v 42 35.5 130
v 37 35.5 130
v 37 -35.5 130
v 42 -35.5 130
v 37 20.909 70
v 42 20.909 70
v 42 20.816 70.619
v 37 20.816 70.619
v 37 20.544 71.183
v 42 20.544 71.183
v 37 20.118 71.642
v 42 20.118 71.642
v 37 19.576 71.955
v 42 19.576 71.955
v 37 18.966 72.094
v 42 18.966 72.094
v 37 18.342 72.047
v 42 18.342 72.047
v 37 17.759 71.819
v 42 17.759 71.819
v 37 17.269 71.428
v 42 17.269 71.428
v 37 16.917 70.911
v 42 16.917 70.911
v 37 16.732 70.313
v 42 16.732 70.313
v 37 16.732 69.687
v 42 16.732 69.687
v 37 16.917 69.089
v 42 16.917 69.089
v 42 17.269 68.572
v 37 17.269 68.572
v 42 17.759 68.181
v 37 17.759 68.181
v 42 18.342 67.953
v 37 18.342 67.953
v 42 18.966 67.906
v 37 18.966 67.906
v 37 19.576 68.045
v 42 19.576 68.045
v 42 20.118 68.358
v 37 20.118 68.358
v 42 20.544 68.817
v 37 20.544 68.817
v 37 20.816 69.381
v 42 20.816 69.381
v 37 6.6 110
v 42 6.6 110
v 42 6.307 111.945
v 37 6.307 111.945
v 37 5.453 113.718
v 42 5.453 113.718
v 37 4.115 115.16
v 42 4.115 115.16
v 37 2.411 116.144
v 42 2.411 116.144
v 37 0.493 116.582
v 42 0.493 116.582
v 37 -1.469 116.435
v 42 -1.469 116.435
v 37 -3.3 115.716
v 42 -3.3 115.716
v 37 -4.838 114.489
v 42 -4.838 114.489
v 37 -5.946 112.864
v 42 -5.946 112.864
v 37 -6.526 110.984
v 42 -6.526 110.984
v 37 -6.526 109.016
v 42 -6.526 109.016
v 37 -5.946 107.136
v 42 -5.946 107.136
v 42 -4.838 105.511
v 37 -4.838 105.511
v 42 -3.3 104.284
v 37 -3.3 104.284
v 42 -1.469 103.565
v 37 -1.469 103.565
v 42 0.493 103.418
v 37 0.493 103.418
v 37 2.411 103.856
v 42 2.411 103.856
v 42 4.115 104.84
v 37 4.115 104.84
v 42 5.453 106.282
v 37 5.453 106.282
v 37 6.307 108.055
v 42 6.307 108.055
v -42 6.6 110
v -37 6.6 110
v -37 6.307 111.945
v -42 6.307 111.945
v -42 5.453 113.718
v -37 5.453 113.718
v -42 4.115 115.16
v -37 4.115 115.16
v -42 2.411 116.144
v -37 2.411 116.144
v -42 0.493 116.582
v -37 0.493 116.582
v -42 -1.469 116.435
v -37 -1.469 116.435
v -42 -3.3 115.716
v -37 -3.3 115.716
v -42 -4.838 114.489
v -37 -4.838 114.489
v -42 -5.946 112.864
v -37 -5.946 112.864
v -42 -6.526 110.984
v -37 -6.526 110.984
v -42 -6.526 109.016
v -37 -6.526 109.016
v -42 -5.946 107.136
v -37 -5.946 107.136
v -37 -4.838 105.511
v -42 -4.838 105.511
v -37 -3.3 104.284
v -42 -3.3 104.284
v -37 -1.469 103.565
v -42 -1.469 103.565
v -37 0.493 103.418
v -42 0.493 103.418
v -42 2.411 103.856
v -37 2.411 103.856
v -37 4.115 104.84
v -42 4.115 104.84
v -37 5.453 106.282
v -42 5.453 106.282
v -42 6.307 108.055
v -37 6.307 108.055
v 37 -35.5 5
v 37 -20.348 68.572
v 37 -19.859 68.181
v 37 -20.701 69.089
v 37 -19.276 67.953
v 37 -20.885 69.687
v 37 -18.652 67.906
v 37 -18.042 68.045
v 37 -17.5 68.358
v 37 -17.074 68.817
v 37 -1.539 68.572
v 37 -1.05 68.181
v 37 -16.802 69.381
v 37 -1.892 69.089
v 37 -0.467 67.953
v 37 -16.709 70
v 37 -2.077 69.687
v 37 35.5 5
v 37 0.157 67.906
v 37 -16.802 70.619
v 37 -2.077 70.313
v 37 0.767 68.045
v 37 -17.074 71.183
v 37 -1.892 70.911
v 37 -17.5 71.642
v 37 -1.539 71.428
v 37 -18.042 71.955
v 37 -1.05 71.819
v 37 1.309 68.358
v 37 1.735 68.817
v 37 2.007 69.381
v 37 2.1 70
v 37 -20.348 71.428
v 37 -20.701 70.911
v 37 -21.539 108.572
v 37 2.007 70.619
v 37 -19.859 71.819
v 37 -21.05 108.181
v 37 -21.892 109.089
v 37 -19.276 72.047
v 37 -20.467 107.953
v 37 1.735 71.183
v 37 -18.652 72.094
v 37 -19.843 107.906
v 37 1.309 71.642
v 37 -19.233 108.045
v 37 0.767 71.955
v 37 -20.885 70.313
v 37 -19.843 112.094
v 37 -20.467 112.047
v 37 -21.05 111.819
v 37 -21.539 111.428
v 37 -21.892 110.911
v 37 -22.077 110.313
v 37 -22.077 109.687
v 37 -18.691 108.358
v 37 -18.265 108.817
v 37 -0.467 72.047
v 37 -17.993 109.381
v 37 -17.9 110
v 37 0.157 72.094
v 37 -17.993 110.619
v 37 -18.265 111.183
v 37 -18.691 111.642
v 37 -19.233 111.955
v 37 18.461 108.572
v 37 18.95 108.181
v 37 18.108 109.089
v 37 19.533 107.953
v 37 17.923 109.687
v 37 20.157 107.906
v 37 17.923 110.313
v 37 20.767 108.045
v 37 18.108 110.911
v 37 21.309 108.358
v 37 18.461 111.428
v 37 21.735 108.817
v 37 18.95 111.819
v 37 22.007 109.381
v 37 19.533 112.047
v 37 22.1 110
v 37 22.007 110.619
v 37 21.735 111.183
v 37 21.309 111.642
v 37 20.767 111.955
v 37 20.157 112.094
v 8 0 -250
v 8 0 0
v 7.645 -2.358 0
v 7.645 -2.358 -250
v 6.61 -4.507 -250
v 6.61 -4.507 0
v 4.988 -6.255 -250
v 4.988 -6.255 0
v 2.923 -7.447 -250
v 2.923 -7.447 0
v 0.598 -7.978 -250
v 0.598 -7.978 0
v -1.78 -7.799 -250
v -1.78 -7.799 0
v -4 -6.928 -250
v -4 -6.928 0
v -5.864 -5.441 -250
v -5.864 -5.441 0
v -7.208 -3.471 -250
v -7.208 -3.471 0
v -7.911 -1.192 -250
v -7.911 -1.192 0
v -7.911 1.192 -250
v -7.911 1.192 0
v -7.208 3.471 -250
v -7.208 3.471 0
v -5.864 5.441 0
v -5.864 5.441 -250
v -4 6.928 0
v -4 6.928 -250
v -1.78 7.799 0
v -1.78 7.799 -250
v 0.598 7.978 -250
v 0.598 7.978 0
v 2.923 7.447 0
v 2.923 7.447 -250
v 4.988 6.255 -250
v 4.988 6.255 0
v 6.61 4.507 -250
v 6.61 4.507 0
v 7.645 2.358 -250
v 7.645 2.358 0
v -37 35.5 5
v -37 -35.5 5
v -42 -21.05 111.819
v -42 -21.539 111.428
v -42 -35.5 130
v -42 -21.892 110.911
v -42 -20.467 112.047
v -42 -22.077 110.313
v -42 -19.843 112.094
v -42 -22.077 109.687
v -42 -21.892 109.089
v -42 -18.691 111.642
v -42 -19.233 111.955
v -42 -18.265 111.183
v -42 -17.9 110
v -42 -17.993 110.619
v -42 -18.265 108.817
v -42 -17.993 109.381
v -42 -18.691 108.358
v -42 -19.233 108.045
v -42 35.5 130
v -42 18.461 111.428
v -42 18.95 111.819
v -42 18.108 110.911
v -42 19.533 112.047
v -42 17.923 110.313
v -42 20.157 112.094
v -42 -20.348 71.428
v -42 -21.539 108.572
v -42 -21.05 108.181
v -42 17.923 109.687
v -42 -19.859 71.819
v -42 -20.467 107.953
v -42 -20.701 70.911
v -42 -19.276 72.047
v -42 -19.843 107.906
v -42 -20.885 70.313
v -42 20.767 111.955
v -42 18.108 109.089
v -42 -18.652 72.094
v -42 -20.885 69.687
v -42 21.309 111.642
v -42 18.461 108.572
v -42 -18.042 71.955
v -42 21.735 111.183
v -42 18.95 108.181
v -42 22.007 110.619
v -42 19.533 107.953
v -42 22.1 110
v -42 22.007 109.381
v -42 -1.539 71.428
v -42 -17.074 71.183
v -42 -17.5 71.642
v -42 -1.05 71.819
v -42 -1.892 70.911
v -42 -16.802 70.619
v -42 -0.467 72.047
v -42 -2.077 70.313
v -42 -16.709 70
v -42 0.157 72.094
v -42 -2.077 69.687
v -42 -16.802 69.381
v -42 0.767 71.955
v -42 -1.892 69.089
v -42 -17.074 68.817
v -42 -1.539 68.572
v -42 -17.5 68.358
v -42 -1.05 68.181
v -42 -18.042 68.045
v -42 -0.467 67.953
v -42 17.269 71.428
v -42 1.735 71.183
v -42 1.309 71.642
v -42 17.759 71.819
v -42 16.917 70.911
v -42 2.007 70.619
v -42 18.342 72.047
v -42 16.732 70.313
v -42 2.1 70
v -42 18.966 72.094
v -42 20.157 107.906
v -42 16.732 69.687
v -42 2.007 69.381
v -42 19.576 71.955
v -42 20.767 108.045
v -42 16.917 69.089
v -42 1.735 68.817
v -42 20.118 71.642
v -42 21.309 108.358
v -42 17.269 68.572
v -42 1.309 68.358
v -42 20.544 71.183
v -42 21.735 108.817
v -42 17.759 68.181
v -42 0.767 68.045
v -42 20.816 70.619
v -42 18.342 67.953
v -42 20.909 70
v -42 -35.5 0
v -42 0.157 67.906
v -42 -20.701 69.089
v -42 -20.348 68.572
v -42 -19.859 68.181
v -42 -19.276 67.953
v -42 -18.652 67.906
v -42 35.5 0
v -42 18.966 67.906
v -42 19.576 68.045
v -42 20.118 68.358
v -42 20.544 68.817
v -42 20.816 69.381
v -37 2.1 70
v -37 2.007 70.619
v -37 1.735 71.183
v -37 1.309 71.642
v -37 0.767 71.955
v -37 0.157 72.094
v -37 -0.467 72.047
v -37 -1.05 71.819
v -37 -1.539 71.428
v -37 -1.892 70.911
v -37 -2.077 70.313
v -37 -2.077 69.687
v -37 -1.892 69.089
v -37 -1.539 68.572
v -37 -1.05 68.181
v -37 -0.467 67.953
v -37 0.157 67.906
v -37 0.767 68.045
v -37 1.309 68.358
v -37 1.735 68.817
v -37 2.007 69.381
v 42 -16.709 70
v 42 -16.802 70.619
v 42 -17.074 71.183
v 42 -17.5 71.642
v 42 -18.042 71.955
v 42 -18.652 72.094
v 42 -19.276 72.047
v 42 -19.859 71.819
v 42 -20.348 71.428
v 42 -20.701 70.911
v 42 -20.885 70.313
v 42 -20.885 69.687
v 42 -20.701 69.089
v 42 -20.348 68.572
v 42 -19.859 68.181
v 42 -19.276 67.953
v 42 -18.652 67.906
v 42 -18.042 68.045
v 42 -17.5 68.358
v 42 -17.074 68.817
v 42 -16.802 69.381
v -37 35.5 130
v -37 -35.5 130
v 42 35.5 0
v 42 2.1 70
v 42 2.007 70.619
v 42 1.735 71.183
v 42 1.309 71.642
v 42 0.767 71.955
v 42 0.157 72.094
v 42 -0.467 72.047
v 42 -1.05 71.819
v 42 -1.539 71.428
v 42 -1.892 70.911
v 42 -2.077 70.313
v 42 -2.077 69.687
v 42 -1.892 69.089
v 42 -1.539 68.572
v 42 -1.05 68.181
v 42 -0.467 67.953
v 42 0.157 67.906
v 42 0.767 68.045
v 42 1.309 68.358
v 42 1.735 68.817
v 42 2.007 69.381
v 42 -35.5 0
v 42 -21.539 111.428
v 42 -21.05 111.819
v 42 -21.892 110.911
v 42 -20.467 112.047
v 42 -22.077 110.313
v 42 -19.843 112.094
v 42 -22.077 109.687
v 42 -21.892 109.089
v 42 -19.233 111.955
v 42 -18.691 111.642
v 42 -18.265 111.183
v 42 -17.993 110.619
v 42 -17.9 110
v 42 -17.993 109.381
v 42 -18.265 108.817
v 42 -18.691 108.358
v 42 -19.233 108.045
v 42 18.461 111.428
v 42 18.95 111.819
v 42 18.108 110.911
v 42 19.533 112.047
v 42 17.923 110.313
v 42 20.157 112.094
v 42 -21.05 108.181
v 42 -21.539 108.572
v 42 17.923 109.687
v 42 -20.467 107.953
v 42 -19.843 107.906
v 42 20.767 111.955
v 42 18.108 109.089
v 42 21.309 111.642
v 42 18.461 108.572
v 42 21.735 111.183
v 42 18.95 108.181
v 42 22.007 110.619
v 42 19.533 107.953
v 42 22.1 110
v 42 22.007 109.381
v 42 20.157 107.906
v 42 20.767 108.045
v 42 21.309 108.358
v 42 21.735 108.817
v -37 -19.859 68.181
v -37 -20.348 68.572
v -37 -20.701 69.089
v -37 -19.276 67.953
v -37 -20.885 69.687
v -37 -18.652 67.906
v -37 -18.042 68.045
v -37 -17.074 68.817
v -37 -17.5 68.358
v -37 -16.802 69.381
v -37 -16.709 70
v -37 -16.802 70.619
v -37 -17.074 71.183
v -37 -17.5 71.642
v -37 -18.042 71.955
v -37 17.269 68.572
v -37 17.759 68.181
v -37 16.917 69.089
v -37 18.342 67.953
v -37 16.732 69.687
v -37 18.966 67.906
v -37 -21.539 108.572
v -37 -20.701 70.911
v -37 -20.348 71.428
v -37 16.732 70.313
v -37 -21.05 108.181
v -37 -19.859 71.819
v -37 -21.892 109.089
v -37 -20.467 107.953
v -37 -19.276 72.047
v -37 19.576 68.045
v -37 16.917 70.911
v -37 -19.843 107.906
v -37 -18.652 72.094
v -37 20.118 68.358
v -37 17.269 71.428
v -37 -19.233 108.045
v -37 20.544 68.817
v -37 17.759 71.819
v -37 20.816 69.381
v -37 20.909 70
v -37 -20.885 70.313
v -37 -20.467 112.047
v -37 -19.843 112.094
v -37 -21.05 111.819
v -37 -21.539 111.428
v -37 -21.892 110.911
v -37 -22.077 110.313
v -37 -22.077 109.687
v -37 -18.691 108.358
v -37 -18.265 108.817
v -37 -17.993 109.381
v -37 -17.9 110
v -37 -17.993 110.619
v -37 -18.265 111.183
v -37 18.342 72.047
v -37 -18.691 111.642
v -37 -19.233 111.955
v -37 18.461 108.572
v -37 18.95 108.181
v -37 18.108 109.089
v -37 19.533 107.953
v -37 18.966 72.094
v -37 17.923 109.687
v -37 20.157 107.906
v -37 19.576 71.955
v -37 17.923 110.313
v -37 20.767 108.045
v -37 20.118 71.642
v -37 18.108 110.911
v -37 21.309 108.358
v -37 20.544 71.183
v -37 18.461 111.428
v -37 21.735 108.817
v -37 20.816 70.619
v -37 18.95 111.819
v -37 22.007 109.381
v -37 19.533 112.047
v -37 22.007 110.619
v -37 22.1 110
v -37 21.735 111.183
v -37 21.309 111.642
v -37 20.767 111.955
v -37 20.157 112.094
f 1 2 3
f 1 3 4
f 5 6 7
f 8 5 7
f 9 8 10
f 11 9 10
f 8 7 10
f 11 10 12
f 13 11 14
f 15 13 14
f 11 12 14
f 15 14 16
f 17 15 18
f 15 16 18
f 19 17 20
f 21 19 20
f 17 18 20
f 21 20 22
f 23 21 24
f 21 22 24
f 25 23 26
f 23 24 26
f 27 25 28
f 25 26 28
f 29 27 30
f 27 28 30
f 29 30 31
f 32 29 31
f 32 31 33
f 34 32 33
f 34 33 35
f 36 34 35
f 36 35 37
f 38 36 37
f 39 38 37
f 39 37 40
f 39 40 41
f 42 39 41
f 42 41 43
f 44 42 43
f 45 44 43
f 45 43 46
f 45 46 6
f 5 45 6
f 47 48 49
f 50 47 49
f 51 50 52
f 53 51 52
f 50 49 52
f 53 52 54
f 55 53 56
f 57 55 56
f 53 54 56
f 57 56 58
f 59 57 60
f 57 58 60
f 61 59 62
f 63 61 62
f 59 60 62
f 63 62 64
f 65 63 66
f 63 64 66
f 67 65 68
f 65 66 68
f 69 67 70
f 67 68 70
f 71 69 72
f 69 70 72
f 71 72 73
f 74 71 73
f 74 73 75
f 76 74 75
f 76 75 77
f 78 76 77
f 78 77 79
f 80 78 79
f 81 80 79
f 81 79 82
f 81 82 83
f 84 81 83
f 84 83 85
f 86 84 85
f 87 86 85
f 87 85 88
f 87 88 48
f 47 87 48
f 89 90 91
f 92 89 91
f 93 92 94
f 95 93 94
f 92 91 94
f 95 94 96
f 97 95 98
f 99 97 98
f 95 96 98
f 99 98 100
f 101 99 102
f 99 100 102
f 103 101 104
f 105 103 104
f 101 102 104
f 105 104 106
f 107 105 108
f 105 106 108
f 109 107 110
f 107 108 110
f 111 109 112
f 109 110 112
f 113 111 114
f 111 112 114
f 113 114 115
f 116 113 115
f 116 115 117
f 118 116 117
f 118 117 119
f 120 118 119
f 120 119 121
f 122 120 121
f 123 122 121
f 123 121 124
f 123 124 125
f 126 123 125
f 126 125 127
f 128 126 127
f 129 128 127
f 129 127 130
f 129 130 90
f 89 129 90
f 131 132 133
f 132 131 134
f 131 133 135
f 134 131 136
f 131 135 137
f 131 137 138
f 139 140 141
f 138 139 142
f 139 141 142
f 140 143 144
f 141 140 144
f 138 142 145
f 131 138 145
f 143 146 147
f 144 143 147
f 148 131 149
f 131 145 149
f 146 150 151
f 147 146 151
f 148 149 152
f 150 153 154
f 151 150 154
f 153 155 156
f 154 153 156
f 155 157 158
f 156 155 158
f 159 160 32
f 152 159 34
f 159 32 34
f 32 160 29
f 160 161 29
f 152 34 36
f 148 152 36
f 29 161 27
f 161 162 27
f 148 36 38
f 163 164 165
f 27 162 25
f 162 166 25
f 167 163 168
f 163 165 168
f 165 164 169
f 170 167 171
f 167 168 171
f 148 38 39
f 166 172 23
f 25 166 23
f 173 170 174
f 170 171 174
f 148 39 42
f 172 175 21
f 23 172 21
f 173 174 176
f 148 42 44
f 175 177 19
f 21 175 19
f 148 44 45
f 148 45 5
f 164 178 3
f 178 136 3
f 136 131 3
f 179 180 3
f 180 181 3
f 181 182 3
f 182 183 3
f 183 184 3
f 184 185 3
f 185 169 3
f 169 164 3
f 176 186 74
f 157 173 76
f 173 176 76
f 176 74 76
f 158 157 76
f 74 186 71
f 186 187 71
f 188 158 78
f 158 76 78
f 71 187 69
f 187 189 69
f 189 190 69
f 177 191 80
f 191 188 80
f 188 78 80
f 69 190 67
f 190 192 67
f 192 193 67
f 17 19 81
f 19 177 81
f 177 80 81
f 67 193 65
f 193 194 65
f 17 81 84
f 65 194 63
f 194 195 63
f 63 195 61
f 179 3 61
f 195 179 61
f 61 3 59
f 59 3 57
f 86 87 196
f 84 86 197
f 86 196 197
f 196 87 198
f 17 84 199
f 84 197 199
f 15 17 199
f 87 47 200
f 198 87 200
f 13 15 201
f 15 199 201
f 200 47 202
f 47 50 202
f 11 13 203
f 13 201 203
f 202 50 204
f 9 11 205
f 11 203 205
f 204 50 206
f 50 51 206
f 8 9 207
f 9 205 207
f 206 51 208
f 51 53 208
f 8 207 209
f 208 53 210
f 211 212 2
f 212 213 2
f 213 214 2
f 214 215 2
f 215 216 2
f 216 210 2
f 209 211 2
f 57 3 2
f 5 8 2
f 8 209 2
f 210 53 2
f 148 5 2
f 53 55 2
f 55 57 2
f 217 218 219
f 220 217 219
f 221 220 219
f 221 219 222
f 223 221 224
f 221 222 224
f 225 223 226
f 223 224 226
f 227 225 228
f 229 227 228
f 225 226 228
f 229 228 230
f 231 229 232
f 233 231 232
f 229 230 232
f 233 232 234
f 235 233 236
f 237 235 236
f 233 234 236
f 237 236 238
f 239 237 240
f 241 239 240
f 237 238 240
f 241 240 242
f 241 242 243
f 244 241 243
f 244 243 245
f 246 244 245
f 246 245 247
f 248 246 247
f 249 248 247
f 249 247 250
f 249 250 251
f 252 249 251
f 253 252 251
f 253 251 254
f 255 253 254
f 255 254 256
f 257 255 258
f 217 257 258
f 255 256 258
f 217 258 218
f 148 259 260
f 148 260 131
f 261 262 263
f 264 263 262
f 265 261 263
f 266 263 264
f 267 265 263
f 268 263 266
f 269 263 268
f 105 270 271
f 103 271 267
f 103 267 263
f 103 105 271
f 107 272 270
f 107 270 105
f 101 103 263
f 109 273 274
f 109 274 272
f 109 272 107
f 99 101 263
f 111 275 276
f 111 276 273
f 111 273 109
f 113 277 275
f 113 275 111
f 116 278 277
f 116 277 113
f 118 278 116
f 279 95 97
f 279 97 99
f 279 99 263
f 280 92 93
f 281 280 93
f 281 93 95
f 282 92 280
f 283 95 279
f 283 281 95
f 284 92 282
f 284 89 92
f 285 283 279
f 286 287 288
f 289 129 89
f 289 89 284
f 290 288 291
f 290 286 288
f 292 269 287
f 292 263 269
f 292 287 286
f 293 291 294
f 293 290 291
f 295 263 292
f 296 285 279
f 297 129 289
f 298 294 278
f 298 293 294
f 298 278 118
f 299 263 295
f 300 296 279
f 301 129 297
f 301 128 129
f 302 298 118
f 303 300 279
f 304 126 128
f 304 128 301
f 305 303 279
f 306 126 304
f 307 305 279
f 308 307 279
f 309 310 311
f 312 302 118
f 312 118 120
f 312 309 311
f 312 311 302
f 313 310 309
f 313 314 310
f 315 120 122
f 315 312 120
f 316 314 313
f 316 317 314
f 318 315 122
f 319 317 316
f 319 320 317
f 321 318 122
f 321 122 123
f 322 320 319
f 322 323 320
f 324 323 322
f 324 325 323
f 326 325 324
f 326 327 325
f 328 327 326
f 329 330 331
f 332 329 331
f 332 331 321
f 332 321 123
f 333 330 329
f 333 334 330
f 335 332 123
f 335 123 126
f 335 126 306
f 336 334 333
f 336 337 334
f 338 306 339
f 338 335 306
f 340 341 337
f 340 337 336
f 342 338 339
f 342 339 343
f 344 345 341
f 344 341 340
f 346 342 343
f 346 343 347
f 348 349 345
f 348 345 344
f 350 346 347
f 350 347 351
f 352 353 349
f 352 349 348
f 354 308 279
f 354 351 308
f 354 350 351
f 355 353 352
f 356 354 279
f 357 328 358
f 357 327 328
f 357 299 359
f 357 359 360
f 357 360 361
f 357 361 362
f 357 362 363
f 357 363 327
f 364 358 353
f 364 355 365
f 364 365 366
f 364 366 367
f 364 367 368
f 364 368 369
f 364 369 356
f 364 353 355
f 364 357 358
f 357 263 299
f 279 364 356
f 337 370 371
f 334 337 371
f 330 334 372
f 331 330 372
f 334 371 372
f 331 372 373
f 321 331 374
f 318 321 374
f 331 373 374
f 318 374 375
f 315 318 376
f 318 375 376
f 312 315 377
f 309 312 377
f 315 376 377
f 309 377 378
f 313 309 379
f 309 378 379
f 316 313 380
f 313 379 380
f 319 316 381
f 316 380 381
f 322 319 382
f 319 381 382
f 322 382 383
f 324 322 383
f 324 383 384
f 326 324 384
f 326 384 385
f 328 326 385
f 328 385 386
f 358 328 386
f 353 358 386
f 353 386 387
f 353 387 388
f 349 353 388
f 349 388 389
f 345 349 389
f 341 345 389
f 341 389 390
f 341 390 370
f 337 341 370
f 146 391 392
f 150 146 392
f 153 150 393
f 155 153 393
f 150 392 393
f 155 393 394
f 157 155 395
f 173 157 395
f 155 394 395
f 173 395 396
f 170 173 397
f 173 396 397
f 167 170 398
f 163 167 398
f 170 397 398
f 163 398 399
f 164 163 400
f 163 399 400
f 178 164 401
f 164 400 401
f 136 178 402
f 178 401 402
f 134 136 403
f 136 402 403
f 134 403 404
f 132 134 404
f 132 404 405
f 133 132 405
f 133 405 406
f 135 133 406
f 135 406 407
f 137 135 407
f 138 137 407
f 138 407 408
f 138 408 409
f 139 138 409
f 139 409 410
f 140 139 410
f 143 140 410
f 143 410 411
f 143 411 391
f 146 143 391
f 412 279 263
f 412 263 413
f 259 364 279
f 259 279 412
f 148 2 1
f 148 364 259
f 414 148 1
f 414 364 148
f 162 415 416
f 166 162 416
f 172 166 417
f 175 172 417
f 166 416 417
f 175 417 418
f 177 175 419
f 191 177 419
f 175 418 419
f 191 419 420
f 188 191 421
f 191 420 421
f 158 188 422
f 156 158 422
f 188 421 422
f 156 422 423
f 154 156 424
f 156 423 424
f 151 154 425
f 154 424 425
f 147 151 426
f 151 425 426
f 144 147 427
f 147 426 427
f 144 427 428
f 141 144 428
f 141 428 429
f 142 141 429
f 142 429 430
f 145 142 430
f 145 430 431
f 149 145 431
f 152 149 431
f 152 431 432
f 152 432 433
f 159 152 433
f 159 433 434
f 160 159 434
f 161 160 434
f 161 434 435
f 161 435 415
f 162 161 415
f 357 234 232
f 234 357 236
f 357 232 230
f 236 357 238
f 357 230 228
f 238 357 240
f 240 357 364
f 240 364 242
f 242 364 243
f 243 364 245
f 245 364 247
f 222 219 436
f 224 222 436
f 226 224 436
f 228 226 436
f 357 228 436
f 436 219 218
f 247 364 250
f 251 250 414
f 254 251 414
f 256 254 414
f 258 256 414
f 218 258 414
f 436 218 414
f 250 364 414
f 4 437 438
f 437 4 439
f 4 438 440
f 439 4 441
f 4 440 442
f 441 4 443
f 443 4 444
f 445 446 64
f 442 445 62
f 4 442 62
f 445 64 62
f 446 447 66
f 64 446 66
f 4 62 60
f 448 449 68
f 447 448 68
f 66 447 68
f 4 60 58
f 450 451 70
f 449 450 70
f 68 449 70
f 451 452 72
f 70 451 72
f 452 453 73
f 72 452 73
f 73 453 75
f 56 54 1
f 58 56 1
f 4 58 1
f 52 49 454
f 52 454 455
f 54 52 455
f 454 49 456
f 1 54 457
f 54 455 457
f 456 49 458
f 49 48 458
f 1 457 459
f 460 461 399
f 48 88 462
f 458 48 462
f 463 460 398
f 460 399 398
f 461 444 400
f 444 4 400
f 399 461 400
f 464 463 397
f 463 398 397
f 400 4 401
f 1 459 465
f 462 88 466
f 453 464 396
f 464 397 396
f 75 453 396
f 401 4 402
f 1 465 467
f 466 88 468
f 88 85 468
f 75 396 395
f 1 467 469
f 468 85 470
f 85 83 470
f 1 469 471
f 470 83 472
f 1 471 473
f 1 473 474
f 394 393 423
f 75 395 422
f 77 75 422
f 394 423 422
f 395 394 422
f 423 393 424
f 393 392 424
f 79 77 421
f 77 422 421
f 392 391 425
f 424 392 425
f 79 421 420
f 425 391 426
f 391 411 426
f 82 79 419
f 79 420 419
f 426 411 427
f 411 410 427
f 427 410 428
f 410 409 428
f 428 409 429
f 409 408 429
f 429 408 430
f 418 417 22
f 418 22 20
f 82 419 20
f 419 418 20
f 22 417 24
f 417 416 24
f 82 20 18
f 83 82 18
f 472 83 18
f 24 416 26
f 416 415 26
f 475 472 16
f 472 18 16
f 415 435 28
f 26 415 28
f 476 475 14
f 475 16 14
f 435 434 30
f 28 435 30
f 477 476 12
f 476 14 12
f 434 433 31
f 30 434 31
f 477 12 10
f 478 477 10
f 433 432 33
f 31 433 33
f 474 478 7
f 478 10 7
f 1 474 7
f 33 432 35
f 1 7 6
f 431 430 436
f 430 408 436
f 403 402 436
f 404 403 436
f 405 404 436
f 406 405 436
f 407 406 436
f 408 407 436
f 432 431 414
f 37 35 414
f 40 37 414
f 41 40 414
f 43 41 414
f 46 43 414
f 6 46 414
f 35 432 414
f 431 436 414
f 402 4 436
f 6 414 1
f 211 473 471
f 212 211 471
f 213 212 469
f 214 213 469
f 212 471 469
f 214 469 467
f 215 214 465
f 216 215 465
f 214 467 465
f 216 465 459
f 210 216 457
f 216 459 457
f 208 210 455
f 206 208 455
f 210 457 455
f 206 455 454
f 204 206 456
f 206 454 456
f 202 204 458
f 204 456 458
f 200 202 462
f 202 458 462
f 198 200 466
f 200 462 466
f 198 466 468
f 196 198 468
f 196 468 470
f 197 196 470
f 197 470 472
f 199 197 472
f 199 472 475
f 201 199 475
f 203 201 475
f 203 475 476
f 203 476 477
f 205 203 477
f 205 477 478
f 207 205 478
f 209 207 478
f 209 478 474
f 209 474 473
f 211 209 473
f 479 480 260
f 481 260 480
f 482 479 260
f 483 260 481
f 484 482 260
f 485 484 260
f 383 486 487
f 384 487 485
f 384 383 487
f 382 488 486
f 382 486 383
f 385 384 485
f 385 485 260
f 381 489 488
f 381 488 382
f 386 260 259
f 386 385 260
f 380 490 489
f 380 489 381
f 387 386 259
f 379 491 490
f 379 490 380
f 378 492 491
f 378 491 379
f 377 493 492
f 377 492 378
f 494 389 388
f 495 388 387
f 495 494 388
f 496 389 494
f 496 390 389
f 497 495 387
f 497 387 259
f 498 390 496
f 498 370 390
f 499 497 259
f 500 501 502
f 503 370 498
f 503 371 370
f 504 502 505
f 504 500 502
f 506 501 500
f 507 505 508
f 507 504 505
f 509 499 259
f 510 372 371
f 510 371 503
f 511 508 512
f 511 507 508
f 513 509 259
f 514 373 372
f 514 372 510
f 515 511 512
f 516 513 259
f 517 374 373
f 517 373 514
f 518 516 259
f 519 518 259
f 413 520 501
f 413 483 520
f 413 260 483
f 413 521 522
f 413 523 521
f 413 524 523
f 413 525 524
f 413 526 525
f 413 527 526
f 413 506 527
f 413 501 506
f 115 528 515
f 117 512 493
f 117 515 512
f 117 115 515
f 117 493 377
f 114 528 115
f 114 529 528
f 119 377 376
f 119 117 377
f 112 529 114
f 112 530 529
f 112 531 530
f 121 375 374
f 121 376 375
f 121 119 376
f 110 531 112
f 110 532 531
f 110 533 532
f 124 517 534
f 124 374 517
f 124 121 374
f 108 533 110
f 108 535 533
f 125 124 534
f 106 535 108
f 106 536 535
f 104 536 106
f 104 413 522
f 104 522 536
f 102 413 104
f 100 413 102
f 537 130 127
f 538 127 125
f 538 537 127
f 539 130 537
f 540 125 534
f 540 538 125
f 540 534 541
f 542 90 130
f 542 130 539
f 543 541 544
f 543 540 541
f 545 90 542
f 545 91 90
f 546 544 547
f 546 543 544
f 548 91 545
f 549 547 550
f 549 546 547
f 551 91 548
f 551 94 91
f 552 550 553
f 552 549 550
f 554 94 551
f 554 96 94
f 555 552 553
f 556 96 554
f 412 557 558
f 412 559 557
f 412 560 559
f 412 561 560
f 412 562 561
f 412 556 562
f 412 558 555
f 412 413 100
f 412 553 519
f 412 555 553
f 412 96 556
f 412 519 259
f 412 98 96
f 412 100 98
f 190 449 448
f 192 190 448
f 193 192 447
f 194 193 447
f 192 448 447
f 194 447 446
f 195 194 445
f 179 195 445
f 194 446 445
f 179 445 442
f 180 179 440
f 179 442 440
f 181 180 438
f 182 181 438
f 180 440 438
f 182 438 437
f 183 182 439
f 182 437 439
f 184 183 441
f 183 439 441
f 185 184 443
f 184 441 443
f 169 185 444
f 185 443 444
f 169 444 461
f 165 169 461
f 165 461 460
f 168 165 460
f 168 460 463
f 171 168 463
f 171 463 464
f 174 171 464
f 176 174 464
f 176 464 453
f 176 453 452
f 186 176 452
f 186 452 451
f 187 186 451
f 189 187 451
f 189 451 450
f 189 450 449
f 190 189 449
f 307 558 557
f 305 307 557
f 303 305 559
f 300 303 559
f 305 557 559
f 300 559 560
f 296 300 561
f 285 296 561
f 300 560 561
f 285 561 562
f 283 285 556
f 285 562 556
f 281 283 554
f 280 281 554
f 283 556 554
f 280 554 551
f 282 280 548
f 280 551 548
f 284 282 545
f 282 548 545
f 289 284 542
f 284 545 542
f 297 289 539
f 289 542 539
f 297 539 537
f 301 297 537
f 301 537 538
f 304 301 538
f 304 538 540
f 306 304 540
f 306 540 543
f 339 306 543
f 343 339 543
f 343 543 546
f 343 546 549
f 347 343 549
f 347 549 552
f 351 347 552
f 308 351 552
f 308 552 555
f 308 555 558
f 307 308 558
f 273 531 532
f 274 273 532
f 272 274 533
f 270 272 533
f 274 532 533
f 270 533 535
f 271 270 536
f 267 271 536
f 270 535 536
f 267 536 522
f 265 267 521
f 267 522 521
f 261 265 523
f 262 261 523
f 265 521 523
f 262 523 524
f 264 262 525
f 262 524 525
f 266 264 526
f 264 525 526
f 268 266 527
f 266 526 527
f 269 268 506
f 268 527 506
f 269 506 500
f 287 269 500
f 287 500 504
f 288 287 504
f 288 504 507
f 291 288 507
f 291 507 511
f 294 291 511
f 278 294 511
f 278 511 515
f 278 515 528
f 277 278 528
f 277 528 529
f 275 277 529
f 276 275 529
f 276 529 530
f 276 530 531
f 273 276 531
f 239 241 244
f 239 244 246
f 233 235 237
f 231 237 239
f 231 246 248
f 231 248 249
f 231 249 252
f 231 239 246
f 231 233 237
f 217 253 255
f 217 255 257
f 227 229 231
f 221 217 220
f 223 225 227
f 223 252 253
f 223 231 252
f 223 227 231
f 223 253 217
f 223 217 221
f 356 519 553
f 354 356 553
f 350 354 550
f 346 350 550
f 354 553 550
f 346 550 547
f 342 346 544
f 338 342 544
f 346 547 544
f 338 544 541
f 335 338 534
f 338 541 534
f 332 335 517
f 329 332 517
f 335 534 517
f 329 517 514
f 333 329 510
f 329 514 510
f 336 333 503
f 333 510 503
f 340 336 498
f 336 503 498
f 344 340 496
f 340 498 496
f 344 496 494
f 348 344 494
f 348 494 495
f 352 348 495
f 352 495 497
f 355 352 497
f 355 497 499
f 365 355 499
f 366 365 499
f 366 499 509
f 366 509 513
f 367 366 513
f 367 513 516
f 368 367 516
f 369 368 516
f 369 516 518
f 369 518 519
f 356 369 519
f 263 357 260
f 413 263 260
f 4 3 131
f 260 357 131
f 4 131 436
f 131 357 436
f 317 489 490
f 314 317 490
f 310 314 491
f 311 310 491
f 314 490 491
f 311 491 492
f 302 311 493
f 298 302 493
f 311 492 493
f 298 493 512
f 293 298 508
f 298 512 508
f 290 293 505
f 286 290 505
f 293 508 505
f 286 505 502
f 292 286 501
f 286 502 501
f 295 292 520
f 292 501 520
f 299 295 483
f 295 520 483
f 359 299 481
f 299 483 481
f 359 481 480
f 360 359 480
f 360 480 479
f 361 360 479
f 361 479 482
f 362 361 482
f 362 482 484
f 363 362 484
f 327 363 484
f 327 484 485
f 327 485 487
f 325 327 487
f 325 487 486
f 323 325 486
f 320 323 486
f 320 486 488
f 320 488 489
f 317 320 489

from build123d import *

# Parameters (mm, degrees)
SKETCH_W        = 84
SKETCH_H        = 71
PAD_DEPTH       = 130
SKETCH001_W     = 74
SKETCH001_H     = 71
POCKET_DEPTH    = 125
SKETCH002_R     = 8
PAD001_DEPTH    = 250
SKETCH003_R     = 2.1
SKETCH003_R_2   = 6.6
POCKET001_DEPTH = 84.001


with BuildPart() as part:
    # Sketch → Pad (new body)
    with BuildSketch(Plane.XY):
        Rectangle(SKETCH_W, SKETCH_H)
    extrude(amount=PAD_DEPTH)

    # Sketch001 → Pocket (cut)
    with BuildSketch(Plane.XY.offset(130)):
        Rectangle(SKETCH001_W, SKETCH001_H)
    extrude(amount=-POCKET_DEPTH, mode=Mode.SUBTRACT)

    # Sketch002 → Pad001 (new body)
    with BuildSketch(Plane(origin=(0, 0, 0), x_dir=(1, 0, 0), z_dir=(0, 0, -1))):
        Circle(SKETCH002_R)
    extrude(amount=PAD001_DEPTH)

    # Sketch003 → Pocket001 (cut, through all)
    with BuildSketch(Plane.YZ.offset(42)):
        with Locations((-20, 110)):
            Circle(SKETCH003_R)
        with Locations((20, 110)):
            Circle(SKETCH003_R)
        with Locations((0, 110)):
            Circle(SKETCH003_R_2)
        with Locations((0, 70)):
            Circle(SKETCH003_R)
        with Locations((-18.808843, 70)):
            Circle(SKETCH003_R)
        with Locations((18.808843, 70)):
            Circle(SKETCH003_R)
    extrude(amount=-POCKET001_DEPTH, mode=Mode.SUBTRACT)


solid = part.part
